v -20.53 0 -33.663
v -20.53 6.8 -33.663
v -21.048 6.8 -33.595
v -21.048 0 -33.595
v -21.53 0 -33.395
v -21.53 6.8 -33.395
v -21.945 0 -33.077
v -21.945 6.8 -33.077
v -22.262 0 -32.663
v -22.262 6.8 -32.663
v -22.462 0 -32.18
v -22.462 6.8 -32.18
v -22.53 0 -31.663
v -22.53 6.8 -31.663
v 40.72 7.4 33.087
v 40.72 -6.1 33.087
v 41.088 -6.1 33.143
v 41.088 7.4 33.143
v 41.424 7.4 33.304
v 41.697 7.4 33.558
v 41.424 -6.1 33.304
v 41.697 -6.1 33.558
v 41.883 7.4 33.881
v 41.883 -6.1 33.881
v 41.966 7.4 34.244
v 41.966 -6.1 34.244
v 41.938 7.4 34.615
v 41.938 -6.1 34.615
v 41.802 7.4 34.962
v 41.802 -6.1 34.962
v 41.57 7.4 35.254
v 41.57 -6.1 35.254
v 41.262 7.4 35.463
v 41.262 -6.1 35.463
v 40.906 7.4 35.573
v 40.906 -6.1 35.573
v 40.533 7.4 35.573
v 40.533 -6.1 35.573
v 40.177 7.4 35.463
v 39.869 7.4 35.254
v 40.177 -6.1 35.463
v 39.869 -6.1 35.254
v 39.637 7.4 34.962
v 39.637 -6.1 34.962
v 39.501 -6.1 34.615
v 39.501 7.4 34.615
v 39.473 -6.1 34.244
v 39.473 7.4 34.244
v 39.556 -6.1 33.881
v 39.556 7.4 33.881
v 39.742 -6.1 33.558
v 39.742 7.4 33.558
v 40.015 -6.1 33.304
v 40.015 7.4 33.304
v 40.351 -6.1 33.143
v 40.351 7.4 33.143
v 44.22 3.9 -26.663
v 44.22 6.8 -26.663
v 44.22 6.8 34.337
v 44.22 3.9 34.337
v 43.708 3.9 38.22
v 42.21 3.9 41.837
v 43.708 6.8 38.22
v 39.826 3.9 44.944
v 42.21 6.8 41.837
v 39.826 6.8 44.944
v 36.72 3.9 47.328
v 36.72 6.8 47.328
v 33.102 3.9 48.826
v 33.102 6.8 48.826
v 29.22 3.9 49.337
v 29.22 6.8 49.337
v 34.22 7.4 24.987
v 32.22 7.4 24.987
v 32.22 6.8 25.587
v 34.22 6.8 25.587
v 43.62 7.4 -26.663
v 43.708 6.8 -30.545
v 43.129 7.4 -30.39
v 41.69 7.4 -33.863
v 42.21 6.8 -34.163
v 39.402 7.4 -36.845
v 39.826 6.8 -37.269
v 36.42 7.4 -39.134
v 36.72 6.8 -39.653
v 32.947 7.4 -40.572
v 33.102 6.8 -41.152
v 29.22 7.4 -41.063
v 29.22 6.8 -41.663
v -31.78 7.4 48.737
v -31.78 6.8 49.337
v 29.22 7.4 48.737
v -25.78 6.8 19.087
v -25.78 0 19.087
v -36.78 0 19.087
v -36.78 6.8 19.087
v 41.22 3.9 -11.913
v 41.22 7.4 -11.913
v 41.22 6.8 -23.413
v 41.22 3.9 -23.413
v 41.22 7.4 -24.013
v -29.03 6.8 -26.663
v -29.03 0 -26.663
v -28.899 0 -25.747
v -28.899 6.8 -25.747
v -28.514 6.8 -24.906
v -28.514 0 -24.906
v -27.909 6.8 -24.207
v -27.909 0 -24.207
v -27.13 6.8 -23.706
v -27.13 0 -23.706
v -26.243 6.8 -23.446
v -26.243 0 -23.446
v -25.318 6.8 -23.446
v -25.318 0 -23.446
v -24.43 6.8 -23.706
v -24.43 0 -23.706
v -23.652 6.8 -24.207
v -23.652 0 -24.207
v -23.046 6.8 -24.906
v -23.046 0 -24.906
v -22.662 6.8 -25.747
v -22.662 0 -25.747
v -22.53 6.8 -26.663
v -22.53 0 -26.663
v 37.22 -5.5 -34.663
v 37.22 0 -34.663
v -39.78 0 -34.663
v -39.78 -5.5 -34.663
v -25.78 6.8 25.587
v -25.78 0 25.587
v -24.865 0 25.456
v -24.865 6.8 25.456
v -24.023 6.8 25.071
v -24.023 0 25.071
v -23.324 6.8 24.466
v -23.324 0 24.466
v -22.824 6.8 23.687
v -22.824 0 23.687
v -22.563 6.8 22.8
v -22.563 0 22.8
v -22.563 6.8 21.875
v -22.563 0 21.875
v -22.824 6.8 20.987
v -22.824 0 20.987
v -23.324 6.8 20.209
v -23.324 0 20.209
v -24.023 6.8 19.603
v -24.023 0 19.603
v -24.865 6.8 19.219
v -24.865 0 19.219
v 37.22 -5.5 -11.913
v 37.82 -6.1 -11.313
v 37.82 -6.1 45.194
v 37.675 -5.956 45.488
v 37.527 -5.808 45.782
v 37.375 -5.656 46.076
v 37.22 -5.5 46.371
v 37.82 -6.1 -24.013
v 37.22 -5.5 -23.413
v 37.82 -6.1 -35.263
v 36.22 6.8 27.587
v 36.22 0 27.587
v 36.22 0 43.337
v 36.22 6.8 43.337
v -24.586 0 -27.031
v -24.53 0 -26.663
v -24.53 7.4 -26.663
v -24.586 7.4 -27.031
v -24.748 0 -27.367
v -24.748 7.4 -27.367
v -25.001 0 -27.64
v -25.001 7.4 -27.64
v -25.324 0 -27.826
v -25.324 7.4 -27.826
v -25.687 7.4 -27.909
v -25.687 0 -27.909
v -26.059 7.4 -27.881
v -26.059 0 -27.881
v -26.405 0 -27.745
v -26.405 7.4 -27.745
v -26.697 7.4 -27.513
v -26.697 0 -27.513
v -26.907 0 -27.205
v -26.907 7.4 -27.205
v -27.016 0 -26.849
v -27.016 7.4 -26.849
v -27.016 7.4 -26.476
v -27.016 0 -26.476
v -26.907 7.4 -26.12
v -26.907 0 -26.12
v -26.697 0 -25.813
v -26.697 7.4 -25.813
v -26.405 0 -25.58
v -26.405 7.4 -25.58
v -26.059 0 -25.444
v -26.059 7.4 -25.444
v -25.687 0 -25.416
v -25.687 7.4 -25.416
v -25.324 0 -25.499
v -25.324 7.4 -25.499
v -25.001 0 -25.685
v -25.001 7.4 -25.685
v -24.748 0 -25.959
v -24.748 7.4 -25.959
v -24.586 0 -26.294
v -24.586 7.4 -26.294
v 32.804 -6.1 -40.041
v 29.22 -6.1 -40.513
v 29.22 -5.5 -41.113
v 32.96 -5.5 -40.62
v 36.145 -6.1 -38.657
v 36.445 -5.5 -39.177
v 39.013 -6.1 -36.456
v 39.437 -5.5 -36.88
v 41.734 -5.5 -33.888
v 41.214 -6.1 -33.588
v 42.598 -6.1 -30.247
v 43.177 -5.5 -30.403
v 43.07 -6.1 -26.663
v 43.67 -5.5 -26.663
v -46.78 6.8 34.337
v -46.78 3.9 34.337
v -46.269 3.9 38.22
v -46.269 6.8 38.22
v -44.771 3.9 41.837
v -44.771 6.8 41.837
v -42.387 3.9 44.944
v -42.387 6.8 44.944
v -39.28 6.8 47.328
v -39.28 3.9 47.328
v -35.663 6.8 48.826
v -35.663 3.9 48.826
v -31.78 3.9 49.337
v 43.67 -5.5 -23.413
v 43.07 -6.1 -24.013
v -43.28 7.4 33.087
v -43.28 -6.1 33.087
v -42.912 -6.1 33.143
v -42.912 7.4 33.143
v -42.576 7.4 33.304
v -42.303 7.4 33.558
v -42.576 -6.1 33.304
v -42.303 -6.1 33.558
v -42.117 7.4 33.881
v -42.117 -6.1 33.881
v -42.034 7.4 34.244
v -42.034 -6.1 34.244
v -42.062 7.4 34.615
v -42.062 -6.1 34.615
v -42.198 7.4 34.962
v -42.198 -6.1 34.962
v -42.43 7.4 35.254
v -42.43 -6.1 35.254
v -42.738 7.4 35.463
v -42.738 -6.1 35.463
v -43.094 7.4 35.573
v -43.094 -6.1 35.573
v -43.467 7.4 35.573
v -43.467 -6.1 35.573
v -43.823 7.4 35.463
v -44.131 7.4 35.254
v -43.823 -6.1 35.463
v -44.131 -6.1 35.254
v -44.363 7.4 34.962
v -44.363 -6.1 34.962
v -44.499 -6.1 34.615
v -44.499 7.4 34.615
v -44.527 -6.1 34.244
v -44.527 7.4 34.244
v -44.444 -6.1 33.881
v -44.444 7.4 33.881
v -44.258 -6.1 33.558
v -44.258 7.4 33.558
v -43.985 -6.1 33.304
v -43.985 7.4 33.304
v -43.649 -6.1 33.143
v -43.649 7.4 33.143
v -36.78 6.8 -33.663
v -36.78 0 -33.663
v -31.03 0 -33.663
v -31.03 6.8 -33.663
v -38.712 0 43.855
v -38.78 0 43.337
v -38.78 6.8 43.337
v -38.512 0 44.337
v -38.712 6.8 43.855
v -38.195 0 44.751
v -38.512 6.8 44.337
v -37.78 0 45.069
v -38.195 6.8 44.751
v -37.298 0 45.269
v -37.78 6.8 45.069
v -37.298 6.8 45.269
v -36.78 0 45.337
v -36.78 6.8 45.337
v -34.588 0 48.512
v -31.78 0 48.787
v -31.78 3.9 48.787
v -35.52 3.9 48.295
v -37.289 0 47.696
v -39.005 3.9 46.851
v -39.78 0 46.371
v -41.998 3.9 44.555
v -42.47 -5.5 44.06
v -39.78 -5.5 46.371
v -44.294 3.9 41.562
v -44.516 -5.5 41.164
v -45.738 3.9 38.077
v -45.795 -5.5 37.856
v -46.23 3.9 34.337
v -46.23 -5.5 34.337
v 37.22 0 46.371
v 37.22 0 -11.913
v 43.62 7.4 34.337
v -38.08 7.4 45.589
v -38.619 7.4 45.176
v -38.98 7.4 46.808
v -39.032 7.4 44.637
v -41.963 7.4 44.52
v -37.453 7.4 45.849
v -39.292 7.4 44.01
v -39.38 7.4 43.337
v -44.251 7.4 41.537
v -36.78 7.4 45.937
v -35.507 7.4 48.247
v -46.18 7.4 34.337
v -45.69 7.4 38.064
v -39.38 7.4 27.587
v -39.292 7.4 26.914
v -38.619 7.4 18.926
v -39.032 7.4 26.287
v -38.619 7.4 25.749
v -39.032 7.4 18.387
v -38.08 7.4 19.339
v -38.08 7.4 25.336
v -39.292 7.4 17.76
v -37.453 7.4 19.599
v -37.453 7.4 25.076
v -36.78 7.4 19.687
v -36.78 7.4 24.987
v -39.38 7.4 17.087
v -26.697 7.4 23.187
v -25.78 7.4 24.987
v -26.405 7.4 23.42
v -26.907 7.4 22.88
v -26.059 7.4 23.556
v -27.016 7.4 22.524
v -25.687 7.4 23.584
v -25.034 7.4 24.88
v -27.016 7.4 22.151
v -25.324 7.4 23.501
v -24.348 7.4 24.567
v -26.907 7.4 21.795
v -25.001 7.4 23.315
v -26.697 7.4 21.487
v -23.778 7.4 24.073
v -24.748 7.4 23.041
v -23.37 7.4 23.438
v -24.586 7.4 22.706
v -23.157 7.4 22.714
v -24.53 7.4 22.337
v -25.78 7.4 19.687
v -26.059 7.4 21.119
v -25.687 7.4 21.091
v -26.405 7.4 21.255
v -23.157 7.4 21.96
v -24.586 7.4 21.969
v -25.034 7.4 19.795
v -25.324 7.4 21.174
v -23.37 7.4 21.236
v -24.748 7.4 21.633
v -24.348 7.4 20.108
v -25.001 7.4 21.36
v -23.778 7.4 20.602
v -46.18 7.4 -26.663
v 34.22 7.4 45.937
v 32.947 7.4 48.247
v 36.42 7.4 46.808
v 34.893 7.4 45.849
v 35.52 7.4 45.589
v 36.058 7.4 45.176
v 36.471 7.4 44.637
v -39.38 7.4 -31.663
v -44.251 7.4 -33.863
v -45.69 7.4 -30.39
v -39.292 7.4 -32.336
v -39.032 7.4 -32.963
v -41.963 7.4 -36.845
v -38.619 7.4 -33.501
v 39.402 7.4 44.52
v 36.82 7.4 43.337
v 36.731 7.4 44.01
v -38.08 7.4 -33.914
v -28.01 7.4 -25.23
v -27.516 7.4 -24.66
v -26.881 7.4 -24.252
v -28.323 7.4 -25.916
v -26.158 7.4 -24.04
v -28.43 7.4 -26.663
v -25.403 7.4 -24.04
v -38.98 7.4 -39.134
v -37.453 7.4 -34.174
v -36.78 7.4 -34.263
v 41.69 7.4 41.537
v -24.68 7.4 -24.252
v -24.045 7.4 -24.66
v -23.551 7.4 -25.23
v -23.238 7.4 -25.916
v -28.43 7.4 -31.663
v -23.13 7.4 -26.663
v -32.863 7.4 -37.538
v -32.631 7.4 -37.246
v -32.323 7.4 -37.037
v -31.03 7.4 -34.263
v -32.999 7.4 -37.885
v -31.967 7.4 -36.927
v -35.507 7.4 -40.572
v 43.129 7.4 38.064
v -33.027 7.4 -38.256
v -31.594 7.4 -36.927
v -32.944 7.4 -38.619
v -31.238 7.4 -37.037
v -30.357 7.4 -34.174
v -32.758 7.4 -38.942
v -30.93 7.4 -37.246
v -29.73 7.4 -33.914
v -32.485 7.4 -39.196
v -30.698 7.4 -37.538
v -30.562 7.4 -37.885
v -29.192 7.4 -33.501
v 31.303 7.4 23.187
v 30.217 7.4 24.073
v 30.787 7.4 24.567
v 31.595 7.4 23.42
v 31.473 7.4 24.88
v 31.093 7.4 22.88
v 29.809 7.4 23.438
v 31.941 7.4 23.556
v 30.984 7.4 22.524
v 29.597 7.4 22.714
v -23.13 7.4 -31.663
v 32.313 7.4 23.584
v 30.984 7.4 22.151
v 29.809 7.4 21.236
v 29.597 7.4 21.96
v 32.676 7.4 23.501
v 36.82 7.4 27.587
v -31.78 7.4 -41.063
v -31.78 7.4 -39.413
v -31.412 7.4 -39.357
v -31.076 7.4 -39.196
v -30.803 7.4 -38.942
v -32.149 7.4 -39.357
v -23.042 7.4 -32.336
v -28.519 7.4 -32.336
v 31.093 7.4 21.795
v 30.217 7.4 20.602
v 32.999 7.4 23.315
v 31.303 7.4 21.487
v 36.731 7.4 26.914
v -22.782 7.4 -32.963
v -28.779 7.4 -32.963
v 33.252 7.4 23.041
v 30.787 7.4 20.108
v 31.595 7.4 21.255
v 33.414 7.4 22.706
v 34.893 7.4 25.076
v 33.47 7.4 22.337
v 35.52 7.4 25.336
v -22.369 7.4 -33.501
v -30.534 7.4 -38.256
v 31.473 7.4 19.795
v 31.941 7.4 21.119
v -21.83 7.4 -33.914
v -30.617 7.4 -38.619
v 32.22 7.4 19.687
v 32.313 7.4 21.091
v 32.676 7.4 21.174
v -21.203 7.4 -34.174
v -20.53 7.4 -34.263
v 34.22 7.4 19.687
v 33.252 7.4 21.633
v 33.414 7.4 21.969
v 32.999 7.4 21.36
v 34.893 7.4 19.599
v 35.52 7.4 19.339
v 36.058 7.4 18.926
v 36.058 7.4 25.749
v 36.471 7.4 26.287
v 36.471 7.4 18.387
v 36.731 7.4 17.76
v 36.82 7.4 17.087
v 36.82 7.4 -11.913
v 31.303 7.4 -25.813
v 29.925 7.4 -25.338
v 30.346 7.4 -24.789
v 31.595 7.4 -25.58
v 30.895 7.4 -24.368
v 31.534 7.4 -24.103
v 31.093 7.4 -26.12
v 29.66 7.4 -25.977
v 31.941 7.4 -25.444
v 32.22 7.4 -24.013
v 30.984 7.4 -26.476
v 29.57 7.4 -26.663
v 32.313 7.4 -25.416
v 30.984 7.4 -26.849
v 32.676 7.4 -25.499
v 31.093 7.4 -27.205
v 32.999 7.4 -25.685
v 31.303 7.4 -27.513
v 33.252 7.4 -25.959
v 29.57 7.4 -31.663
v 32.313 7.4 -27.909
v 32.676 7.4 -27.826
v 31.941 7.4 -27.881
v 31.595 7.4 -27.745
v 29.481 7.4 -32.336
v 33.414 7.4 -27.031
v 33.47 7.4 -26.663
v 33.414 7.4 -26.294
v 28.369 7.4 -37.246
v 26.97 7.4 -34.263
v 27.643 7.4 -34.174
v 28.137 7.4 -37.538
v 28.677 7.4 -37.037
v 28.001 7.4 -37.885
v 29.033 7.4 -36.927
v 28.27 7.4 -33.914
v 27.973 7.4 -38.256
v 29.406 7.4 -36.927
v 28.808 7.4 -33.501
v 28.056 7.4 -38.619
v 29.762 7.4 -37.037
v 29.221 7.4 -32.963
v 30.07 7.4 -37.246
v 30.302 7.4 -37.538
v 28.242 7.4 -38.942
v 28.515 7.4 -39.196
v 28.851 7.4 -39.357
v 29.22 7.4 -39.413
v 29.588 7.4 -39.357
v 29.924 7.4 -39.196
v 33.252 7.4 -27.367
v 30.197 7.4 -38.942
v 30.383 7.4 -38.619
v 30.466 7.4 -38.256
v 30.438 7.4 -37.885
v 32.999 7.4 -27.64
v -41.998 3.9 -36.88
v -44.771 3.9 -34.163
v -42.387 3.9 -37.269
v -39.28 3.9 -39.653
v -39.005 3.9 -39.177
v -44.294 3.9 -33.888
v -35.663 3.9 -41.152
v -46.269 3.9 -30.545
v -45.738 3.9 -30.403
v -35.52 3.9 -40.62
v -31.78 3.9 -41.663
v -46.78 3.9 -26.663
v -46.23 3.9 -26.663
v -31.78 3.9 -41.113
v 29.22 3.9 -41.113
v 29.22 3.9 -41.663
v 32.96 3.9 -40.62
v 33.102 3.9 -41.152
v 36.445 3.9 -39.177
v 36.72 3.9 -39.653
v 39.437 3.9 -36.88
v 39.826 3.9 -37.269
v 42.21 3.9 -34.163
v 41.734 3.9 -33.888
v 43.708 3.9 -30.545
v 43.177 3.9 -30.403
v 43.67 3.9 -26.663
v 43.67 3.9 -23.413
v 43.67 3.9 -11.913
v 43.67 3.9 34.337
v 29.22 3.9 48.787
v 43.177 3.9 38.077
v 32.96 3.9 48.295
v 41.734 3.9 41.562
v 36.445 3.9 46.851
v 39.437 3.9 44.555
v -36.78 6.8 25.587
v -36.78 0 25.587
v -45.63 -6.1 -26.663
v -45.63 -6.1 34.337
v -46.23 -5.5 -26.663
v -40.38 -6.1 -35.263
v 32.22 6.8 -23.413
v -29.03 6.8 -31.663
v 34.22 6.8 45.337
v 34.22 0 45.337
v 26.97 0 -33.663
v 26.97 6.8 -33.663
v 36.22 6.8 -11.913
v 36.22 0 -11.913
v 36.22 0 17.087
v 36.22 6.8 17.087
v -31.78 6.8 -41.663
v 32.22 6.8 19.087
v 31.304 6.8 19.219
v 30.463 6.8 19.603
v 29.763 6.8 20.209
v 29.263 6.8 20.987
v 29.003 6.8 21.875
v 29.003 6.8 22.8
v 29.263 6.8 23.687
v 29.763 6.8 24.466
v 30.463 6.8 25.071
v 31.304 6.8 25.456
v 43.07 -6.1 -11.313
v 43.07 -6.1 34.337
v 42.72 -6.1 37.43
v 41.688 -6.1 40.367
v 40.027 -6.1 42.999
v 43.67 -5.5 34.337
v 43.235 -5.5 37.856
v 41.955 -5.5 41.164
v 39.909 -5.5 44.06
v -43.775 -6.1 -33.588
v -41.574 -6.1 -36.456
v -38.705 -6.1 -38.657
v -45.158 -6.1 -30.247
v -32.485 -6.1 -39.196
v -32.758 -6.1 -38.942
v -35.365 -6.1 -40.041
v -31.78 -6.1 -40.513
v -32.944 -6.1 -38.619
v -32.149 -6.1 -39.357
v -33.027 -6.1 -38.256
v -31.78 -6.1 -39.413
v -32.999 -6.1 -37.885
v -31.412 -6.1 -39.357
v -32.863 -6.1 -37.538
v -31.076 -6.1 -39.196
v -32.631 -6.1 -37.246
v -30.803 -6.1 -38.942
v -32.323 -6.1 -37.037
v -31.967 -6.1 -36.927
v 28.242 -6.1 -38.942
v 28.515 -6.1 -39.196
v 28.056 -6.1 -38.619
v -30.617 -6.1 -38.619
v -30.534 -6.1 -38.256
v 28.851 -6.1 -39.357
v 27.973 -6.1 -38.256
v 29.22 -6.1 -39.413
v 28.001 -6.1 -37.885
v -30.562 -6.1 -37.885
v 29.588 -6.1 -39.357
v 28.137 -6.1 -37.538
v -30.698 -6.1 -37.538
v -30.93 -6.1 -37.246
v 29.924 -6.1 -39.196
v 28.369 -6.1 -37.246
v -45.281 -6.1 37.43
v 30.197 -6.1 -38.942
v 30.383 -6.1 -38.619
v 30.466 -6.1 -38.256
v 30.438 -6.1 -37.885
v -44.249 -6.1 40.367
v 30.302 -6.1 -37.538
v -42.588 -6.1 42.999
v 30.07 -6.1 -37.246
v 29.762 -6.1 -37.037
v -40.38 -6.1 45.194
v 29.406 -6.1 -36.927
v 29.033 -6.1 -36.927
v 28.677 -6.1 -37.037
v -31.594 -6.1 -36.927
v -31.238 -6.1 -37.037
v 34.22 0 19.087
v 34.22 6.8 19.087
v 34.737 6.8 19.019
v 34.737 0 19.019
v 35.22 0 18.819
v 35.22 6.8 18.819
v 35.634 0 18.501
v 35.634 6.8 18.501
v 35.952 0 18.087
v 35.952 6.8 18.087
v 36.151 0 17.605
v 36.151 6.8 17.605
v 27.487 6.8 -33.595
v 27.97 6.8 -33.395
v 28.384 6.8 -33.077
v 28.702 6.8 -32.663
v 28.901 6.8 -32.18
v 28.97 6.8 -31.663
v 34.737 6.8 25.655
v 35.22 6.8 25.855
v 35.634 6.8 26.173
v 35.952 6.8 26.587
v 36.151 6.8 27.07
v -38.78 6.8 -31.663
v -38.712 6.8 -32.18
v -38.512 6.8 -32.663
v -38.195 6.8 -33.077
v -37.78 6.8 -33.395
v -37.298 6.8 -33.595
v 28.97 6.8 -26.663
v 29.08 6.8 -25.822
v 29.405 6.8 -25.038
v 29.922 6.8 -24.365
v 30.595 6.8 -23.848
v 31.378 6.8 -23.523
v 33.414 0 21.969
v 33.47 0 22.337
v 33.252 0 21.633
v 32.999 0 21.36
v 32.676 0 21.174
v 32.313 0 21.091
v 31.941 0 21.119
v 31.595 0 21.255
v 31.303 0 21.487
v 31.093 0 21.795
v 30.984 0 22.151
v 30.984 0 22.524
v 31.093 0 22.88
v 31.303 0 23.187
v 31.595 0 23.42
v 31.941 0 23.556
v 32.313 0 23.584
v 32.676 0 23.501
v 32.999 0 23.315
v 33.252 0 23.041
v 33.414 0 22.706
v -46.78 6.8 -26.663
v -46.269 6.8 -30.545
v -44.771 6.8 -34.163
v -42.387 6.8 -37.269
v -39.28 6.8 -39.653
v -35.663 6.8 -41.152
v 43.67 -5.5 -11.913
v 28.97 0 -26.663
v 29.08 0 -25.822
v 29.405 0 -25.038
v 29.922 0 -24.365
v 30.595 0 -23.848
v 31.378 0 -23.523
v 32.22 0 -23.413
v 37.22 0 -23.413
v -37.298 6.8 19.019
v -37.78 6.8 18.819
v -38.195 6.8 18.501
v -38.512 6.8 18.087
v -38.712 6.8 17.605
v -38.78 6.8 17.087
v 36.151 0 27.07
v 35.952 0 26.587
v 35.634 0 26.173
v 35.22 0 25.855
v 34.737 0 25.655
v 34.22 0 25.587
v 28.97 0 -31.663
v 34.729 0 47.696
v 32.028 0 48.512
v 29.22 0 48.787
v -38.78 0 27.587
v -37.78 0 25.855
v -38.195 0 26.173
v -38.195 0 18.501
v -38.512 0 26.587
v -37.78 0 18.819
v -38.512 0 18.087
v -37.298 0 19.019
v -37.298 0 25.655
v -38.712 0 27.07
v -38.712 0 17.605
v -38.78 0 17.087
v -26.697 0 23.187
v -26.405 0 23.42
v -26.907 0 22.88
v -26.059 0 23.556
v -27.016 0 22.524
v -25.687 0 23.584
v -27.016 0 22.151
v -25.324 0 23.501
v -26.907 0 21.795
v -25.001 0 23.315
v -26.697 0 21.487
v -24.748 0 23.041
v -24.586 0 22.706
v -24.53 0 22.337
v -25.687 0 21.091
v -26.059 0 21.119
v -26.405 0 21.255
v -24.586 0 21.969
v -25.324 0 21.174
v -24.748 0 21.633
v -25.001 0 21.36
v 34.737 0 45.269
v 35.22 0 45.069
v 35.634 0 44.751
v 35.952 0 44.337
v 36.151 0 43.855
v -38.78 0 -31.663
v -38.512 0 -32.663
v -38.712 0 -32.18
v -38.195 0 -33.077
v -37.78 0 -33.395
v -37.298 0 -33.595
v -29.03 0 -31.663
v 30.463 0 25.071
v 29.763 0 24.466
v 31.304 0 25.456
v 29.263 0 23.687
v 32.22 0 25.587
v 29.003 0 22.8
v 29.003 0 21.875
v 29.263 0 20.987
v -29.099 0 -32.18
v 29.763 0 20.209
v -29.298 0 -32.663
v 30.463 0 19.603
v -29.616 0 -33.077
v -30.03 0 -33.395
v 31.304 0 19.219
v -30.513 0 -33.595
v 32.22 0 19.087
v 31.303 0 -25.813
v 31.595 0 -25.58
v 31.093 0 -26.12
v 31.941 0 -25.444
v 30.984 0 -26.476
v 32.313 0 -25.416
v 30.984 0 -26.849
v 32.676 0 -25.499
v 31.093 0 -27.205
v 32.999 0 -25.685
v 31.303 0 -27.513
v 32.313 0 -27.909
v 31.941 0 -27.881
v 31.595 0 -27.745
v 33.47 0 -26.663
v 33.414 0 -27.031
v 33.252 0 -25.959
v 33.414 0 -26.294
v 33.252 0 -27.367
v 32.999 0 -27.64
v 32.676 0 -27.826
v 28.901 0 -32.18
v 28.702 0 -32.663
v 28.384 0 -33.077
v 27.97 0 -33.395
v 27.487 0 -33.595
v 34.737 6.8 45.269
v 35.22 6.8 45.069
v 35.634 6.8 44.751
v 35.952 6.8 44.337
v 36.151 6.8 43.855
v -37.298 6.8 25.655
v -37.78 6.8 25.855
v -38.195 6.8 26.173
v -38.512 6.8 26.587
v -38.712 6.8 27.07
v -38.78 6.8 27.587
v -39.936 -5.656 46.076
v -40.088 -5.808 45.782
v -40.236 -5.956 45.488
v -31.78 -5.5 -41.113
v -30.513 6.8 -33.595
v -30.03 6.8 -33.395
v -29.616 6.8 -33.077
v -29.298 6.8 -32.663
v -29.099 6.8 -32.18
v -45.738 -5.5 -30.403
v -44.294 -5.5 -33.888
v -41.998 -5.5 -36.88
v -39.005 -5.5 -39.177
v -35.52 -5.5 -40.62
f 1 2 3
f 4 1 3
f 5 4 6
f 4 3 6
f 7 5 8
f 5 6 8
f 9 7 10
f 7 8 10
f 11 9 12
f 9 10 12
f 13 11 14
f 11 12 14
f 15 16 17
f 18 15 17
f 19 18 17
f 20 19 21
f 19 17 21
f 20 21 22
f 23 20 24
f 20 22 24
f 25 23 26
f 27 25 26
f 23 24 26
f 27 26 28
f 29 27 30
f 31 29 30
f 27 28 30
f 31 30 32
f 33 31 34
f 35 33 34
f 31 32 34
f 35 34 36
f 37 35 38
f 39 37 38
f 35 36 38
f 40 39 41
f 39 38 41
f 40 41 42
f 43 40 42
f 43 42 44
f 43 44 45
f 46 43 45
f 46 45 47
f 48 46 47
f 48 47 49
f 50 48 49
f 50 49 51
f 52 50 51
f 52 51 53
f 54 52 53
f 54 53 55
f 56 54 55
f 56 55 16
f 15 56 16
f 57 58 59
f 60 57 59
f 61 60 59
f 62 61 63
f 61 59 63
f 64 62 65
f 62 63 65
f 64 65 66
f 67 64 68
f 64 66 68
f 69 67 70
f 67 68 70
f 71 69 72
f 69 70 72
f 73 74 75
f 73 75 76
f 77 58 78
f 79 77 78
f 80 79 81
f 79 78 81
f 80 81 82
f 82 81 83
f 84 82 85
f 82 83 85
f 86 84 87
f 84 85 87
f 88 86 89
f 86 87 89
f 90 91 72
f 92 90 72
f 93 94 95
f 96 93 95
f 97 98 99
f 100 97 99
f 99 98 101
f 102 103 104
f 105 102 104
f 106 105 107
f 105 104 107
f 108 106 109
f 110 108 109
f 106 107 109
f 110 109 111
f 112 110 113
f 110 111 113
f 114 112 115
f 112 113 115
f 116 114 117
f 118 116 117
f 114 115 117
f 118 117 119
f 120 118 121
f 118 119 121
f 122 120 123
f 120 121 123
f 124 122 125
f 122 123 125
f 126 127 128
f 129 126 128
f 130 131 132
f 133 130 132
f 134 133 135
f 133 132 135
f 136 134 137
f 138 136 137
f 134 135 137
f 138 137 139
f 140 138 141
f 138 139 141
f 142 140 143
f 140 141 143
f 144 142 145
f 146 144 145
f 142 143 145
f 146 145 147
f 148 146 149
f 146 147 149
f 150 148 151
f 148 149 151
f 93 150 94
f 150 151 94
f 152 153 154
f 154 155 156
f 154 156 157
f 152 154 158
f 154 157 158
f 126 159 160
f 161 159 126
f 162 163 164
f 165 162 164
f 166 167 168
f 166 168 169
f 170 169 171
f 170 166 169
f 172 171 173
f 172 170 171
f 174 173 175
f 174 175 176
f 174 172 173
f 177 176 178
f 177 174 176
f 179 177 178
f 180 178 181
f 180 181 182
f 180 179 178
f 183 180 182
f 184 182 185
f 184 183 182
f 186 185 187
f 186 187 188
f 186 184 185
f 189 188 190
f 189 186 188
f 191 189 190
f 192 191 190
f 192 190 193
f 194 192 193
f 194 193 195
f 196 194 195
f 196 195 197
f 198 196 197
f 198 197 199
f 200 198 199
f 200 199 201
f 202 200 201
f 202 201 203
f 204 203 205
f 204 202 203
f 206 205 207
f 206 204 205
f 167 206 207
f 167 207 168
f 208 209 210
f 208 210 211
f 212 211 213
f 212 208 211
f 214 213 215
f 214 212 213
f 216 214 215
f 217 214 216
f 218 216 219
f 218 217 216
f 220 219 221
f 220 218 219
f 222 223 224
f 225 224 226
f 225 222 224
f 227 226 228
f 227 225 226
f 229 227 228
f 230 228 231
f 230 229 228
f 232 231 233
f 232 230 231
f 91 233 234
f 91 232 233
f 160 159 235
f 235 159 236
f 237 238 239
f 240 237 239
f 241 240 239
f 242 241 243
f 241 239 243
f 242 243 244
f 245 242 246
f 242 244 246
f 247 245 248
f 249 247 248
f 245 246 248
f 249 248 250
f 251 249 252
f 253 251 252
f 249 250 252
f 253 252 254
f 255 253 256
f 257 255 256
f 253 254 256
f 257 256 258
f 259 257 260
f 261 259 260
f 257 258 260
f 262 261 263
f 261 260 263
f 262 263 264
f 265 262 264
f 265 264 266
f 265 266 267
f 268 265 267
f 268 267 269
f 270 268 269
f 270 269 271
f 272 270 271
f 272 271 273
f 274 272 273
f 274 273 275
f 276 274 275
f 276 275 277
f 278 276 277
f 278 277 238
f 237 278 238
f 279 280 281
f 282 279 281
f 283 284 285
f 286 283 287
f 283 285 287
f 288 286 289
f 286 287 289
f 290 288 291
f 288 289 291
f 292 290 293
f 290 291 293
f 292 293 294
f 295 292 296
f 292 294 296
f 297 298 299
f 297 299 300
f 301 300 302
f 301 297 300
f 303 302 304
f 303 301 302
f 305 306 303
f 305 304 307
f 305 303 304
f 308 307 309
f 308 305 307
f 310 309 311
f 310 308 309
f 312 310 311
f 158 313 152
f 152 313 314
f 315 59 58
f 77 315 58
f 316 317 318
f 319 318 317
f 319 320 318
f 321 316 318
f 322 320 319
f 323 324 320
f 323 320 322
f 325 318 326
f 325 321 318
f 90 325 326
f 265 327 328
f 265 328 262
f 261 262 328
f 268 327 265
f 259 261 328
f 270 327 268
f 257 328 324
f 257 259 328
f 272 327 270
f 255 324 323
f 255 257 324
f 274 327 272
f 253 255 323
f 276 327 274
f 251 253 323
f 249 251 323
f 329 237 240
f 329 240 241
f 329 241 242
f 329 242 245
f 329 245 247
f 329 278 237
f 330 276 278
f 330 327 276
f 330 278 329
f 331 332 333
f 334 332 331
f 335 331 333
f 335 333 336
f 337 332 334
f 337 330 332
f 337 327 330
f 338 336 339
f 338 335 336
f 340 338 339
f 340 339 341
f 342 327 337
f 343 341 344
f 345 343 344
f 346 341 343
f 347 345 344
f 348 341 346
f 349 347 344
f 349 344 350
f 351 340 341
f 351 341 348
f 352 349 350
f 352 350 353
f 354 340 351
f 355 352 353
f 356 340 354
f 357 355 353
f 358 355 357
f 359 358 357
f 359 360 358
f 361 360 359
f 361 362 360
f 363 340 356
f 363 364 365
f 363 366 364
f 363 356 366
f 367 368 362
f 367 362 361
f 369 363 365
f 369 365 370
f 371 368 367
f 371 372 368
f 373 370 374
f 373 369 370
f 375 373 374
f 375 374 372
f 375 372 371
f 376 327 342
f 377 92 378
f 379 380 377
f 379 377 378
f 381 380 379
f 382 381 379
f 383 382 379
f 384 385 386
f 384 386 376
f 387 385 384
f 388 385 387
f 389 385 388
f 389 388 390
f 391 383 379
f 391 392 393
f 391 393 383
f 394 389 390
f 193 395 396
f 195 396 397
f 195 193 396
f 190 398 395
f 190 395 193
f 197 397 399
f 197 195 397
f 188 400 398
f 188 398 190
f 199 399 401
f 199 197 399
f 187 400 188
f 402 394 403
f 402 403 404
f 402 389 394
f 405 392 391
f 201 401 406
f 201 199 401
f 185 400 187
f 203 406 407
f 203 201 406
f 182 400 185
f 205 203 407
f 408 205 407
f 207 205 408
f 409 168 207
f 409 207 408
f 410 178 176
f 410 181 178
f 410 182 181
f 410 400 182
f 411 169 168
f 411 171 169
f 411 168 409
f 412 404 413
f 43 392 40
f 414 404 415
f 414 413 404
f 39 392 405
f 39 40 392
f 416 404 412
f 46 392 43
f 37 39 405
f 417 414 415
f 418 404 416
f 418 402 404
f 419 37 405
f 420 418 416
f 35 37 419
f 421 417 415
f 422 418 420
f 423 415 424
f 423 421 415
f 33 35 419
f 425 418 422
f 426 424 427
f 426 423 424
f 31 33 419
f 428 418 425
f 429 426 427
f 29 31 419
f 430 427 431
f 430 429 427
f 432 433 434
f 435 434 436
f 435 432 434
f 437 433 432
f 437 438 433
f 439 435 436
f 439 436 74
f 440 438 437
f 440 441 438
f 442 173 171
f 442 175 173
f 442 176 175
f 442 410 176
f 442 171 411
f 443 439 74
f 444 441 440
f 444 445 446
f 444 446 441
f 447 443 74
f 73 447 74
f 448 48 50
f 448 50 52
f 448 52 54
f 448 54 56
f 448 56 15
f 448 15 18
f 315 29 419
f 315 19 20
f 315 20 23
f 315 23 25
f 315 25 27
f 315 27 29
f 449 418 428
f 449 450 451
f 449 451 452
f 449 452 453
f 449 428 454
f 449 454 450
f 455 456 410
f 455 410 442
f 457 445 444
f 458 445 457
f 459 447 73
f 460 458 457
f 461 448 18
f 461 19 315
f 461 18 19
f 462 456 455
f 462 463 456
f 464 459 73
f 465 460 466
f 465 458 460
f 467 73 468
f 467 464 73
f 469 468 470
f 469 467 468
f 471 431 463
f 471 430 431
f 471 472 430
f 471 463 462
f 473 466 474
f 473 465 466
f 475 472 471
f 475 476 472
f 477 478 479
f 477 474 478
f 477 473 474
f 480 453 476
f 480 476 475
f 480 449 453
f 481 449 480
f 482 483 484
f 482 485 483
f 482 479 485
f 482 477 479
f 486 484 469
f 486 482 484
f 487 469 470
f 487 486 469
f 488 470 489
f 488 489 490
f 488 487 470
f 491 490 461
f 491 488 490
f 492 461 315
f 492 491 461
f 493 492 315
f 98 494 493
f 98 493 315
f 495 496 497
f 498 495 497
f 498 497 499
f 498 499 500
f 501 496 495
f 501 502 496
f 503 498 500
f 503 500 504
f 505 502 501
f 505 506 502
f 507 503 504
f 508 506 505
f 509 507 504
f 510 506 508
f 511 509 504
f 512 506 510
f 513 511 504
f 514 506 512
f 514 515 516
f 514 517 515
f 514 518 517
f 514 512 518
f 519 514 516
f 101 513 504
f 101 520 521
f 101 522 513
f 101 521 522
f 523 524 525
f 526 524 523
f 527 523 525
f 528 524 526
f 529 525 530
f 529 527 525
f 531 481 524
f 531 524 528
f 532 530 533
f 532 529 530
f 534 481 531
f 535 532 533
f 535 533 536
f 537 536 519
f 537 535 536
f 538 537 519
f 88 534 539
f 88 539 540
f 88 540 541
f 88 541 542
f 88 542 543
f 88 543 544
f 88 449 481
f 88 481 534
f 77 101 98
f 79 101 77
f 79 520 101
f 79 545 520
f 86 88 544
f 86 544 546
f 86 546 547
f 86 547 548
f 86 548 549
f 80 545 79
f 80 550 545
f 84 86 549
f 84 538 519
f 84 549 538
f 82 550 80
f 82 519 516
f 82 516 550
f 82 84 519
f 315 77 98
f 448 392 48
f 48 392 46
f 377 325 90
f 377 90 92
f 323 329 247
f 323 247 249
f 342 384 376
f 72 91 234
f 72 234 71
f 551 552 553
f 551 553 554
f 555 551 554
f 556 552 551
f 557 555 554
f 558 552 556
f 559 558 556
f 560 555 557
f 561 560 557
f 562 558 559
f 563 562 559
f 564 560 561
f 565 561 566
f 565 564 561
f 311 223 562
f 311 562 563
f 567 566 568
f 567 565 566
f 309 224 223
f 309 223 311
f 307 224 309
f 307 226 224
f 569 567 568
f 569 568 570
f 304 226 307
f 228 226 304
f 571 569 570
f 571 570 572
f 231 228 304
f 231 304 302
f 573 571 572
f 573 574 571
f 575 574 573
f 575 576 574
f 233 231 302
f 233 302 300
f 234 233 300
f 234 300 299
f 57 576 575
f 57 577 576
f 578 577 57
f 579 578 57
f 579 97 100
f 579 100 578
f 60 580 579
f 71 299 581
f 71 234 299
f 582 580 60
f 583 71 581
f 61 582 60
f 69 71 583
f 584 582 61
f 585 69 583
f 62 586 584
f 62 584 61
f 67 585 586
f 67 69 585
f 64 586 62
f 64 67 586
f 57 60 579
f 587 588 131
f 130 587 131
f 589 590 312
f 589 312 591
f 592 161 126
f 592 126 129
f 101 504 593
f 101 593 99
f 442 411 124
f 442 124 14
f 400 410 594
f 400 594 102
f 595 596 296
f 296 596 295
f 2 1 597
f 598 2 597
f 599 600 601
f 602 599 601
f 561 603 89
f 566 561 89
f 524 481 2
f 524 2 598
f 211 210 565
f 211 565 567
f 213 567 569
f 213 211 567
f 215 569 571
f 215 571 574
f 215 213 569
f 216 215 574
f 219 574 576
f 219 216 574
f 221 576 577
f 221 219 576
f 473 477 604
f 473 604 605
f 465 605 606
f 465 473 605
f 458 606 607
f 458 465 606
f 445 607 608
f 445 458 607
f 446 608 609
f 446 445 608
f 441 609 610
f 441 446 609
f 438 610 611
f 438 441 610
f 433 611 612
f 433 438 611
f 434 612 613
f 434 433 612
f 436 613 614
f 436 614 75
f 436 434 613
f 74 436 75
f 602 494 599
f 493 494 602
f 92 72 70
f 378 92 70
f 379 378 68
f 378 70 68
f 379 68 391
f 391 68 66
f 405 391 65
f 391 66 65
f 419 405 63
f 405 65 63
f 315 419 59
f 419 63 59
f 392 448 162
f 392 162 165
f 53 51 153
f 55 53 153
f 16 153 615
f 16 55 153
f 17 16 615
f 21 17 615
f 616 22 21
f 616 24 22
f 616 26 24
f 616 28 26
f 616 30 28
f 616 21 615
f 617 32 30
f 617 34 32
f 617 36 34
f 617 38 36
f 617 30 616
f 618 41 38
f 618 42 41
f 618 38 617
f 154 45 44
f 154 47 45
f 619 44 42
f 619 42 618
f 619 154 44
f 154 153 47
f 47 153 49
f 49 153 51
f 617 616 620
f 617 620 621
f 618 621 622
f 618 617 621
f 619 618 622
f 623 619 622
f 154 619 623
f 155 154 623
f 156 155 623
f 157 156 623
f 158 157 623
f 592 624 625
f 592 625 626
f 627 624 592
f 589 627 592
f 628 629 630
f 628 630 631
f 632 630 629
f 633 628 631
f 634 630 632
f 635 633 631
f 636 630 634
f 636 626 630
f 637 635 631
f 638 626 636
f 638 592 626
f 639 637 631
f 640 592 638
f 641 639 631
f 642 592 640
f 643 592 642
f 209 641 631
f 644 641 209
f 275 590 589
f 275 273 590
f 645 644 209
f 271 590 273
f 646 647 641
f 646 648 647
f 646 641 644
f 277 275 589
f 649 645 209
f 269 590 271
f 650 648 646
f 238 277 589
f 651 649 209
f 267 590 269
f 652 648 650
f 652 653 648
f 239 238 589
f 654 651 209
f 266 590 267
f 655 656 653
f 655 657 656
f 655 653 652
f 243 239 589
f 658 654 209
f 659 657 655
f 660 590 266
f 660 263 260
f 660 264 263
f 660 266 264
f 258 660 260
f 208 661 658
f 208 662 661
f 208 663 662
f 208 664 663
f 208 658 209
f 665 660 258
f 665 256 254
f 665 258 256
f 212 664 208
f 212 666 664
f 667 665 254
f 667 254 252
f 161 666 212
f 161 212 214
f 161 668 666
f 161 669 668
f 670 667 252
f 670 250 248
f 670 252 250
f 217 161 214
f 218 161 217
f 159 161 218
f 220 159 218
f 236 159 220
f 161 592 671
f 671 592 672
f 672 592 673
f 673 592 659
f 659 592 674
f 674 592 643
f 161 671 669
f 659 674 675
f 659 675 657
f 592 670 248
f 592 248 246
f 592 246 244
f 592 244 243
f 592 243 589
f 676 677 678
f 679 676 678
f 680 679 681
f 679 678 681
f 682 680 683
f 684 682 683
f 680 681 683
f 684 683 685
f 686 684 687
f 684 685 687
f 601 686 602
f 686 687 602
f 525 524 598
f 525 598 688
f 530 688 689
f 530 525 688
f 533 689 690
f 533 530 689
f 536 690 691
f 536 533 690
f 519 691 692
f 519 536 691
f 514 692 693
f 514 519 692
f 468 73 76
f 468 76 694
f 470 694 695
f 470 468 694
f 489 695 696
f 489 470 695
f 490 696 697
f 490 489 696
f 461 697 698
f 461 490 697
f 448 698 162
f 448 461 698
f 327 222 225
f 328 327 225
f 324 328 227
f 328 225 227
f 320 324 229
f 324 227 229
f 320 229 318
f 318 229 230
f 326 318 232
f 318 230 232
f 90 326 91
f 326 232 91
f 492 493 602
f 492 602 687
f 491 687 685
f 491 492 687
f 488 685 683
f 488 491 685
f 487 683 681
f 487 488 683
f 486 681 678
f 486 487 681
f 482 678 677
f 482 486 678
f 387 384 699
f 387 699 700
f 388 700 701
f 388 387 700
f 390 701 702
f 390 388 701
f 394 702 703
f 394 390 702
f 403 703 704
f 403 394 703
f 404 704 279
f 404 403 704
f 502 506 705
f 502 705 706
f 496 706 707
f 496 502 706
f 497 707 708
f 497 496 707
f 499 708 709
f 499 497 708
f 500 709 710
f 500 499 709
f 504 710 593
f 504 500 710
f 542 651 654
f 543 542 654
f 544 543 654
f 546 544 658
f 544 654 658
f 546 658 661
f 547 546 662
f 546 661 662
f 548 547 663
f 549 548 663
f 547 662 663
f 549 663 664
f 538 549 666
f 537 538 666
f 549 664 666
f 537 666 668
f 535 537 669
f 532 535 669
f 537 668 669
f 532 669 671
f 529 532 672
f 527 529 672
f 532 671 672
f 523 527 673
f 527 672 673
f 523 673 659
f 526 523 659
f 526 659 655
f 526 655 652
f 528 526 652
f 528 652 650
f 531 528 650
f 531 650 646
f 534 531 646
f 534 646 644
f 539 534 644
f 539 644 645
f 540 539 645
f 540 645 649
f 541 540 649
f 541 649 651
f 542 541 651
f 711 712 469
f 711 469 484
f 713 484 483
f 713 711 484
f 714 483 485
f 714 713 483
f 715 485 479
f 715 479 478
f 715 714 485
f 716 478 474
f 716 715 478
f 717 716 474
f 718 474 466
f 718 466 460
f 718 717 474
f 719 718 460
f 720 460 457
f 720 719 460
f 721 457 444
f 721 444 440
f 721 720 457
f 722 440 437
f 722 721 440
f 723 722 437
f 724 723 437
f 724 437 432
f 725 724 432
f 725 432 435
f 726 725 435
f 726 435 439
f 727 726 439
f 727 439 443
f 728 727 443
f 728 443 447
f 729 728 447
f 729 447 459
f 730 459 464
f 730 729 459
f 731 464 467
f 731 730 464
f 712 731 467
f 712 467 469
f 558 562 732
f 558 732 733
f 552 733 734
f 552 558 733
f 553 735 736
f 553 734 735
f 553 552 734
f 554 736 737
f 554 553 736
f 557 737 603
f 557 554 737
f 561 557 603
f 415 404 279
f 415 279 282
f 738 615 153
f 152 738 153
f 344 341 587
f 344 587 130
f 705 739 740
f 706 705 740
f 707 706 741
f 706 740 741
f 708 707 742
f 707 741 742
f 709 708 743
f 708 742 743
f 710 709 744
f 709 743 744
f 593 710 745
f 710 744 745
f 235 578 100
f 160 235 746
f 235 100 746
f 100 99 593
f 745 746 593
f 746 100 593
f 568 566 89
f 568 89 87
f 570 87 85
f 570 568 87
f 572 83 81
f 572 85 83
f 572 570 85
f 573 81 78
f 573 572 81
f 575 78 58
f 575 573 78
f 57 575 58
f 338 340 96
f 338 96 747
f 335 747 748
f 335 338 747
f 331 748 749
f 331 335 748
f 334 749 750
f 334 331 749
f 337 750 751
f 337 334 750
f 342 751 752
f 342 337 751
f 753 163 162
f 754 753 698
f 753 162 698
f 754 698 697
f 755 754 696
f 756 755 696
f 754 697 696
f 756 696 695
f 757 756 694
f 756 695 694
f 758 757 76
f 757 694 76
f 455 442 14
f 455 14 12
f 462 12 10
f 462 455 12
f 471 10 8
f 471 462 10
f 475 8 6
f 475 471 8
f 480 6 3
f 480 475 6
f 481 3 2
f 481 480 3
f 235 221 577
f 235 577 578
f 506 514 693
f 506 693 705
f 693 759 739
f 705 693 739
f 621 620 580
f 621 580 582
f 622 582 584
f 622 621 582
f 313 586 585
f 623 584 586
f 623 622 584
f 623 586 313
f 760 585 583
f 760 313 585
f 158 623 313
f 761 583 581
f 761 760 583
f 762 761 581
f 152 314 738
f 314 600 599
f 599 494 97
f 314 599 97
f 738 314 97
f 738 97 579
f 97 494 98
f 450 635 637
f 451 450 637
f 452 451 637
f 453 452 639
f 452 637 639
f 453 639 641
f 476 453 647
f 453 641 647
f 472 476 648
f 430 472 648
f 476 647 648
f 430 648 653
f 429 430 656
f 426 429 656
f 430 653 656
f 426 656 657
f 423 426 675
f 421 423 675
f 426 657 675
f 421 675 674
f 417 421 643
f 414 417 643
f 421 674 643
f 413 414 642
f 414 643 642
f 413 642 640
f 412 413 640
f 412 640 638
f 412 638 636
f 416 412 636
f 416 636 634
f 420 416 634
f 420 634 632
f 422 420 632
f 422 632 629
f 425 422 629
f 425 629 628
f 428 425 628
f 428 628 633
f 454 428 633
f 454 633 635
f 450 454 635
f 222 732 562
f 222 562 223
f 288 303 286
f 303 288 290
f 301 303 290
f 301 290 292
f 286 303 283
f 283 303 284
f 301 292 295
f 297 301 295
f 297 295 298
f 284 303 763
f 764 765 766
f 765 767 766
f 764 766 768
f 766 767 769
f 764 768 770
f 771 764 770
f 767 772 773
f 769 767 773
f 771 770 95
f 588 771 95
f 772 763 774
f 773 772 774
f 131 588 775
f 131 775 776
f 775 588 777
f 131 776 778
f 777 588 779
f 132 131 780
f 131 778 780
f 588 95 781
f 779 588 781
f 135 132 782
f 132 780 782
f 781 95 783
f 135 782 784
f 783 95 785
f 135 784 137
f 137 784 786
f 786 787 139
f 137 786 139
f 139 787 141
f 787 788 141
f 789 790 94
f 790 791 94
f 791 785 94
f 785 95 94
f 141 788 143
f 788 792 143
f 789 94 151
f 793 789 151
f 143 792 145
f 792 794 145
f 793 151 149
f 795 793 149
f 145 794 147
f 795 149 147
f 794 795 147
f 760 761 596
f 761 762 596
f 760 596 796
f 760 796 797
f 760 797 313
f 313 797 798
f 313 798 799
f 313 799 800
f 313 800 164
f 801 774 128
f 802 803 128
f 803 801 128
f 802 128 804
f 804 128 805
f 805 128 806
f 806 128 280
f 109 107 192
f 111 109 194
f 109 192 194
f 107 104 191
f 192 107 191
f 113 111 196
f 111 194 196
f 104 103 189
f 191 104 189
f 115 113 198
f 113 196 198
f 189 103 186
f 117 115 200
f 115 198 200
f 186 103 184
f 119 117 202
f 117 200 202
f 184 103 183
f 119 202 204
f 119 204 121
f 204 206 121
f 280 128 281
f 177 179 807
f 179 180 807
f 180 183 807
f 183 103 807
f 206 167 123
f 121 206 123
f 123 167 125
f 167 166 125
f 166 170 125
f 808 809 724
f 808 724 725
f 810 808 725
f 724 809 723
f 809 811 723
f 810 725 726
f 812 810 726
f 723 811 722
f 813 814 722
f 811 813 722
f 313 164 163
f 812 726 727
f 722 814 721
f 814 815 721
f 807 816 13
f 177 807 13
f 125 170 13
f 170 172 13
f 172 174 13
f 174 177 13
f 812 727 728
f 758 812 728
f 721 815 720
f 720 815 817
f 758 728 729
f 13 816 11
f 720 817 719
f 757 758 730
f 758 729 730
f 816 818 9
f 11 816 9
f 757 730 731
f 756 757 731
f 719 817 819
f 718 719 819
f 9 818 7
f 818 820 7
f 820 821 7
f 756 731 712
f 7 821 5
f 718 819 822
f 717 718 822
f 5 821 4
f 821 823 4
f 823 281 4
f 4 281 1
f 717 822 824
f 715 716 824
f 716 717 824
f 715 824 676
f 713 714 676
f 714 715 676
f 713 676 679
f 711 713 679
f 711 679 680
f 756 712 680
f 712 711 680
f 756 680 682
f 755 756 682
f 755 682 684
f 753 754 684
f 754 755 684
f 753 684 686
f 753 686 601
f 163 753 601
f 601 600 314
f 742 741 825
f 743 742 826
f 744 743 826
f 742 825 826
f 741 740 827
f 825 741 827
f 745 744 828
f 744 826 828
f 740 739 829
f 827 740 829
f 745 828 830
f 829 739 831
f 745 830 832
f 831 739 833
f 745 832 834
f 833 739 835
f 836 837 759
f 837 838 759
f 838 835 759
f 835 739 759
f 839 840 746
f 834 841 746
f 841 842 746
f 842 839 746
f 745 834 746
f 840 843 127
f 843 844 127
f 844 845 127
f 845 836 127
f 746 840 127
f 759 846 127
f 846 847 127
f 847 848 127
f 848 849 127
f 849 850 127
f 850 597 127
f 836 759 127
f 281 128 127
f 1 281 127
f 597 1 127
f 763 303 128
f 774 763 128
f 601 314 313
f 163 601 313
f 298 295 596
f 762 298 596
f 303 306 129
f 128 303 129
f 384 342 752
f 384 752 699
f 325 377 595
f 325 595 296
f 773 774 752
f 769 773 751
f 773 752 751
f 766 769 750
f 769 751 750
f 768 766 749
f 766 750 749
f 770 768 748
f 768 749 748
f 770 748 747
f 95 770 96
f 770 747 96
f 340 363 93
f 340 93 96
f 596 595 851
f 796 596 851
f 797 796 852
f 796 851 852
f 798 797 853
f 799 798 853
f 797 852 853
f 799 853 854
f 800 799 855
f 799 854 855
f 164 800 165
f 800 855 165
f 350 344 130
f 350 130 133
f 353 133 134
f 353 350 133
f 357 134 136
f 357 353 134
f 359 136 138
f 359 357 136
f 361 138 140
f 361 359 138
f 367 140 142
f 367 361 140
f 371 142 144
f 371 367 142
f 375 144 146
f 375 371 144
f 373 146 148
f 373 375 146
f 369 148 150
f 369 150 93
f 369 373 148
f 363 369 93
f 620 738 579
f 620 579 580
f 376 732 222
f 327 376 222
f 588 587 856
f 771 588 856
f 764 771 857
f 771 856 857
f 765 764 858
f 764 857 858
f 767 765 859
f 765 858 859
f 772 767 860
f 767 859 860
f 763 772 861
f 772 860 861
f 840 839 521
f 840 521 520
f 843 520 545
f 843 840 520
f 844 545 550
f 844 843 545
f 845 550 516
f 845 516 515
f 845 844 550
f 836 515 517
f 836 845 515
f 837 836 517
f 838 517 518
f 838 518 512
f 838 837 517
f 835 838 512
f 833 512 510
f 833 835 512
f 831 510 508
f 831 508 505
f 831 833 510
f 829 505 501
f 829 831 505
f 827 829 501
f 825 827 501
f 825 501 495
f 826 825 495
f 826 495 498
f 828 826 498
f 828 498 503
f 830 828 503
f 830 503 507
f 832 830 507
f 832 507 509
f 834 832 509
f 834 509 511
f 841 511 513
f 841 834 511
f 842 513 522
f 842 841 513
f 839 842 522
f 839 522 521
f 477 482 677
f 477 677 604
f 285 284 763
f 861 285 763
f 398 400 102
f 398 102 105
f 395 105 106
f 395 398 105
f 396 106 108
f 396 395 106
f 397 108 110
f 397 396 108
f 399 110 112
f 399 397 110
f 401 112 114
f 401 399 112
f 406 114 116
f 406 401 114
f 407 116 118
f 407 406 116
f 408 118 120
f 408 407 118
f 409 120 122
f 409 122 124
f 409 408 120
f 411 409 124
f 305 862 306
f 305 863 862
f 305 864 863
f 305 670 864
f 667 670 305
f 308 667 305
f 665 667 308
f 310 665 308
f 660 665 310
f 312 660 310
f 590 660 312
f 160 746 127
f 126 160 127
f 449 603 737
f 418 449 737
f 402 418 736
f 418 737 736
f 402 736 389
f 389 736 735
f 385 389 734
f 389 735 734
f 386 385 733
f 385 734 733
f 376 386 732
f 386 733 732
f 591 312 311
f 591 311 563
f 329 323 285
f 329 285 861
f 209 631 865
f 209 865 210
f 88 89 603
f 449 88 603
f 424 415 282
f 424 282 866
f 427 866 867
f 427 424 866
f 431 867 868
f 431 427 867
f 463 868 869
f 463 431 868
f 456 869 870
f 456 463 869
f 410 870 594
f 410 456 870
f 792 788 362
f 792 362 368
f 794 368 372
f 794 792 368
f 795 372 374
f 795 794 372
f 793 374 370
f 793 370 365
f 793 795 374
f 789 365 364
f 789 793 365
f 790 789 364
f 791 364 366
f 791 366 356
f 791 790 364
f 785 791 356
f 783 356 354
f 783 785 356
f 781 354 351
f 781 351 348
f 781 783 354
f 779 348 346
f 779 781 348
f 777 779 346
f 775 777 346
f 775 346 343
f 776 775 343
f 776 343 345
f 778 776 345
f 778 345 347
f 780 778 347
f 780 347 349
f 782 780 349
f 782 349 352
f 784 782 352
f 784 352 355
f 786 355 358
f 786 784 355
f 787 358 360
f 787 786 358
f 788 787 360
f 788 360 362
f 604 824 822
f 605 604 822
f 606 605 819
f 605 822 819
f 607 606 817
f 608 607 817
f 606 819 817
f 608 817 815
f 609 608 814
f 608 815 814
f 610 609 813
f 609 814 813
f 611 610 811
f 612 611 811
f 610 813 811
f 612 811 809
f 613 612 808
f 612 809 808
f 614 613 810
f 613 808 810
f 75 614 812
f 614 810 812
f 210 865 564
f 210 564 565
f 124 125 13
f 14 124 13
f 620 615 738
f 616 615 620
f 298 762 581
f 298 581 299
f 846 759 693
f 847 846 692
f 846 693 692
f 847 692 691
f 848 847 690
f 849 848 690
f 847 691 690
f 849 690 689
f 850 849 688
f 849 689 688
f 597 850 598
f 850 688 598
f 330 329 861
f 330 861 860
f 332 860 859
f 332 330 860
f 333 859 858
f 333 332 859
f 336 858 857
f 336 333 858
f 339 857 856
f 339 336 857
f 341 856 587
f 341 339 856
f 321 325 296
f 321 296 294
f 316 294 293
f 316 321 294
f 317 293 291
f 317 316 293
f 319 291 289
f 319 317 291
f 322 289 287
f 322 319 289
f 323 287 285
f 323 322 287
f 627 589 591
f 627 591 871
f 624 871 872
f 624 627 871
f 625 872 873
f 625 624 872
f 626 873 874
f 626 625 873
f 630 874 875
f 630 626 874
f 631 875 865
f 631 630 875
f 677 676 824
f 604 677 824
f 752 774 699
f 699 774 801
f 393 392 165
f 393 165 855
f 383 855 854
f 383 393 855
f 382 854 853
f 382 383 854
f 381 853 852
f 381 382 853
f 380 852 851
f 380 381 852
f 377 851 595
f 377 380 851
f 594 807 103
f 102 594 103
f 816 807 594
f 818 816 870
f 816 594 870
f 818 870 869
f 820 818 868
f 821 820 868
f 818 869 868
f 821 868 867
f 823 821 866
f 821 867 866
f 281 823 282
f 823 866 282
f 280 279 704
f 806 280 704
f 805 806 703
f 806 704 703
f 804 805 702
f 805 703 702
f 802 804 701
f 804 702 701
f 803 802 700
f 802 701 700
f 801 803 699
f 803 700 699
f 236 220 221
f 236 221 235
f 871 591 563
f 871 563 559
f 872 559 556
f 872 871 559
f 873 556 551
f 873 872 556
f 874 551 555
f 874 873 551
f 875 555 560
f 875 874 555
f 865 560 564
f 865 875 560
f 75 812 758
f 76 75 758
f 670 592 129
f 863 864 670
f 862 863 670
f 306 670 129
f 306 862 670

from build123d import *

# Parameters (mm, degrees)
SKETCH1_W                   = 91
SKETCH1_H                   = 91
SKETCH1_R                   = 1.25
BOSS_EXTRUDE1_DEPTH         = 7.4
SKETCH3_W                   = 5
SKETCH3_H                   = 11.5
CUT_EXTRUDE1_DEPTH          = 8.4
SKETCH4_W                   = 91
SKETCH4_H                   = 91
BOSS_EXTRUDE2_DEPTH         = 6.1
FILLET1_R                   = 15
CUT_EXTRUDE2_DEPTH          = 10
SKETCH9_W                   = 11.5
SKETCH9_H                   = 10
CUT_EXTRUDE3_DEPTH          = 10
CUT_EXTRUDE4_DEPTH          = 6.1
FILLET2_R                   = 2
TAP_DRILL_FOR_M3X0_5_TAP1_D = 2.5
CHAMFER1_SIZE               = 0.6


with BuildPart() as part:
    # Sketch1 → Boss-Extrude1 (new body)
    with BuildSketch(Plane(origin=(0, 0, 0), x_dir=(1, 0, 0), z_dir=(0, 1, 0))):
        with Locations((-1.280392157, -3.837254902)):
            Rectangle(SKETCH1_W, SKETCH1_H)
        with BuildLine():
            Line((28.969607843, 33.662745098), (28.969607843, 26.662745098))
            ThreePointArc((28.969607843, 26.662745098), (29.921510804, 24.364648059), (32.219607843, 23.412745098))
            Line((32.219607843, 23.412745098), (36.219607843, 23.412745098))
            Line((36.219607843, 23.412745098), (36.219607843, -19.087254902))
            Line((36.219607843, -19.087254902), (32.219607843, -19.087254902))
            ThreePointArc((32.219607843, -19.087254902), (28.969607843, -22.337254902), (32.219607843, -25.587254902))
            Line((32.219607843, -25.587254902), (36.219607843, -25.587254902))
            Line((36.219607843, -25.587254902), (36.219607843, -45.337254902))
            Line((36.219607843, -45.337254902), (-38.780392157, -45.337254902))
            Line((-38.780392157, -45.337254902), (-38.780392157, -25.587254902))
            Line((-38.780392157, -25.587254902), (-25.780392157, -25.587254902))
            ThreePointArc((-25.780392157, -25.587254902), (-22.530392157, -22.337254902), (-25.780392157, -19.087254902))
            Line((-25.780392157, -19.087254902), (-38.780392157, -19.087254902))
            Line((-38.780392157, -19.087254902), (-38.780392157, 33.662745098))
            Line((-38.780392157, 33.662745098), (-29.030392157, 33.662745098))
            Line((-29.030392157, 33.662745098), (-29.030392157, 26.662745098))
            ThreePointArc((-29.030392157, 26.662745098), (-25.780392157, 23.412745098), (-22.530392157, 26.662745098))
            Line((-22.530392157, 26.662745098), (-22.530392157, 33.662745098))
            Line((-22.530392157, 33.662745098), (28.969607843, 33.662745098))
        make_face(mode=Mode.SUBTRACT)
        with Locations((32.219607843, 26.662745098)):
            Circle(SKETCH1_R, mode=Mode.SUBTRACT)
        with Locations((-25.780392157, 26.662745098)):
            Circle(SKETCH1_R, mode=Mode.SUBTRACT)
        with Locations((32.219607843, -22.337254902)):
            Circle(SKETCH1_R, mode=Mode.SUBTRACT)
        with Locations((-25.780392157, -22.337254902)):
            Circle(SKETCH1_R, mode=Mode.SUBTRACT)
    extrude(amount=BOSS_EXTRUDE1_DEPTH)

    # Sketch3 → Cut-Extrude1 (cut, through all)
    with BuildSketch(Plane.XZ):
        with Locations((38.719607843, -17.662745098)):
            Rectangle(SKETCH3_W, SKETCH3_H)
    extrude(amount=-CUT_EXTRUDE1_DEPTH, mode=Mode.SUBTRACT)

    # Sketch4 → Boss-Extrude2 (add)
    with BuildSketch(Plane.XZ):
        with Locations((-1.280392157, 3.837254902)):
            Rectangle(SKETCH4_W, SKETCH4_H)
        Polygon((37.219607843, 45.337254902), (37.219607843, -11.912745098), (41.219607843, -11.912745098), (41.219607843, -23.412745098), (37.219607843, -23.412745098), (37.219607843, -33.662745098), (37.219607843, -34.662745098), (36.219607843, -34.662745098), (-39.780392157, -34.662745098), (-39.780392157, 25.587254902), (-39.780392157, 45.337254902), (-39.780392157, 46.337254902), (-38.780392157, 46.337254902), (36.219607843, 46.337254902), (37.219607843, 46.337254902), align=None, mode=Mode.SUBTRACT)
    extrude(amount=BOSS_EXTRUDE2_DEPTH)

    # Fillet1
    fillet1_edges = [part.edges().sort_by_distance(p)[0] for p in [
        (-46.780392157, 0.65, 49.337254902),
        (-46.780392157, 0.65, -41.662745098),
        (44.219607843, 0.65, -41.662745098),
        (44.219607843, 0.65, 49.337254902),
    ]]
    fillet(fillet1_edges, radius=FILLET1_R)

    # Sketch8 → Cut-Extrude2 (cut)
    with BuildSketch(Plane.XZ.offset(6.1)):
        with BuildLine():
            Line((29.219607843, 49.337254902), (-31.780392157, 49.337254902))
            ThreePointArc((-31.780392157, 49.337254902), (-42.386993875, 44.94385662), (-46.780392157, 34.337254902))
            Line((-46.780392157, 34.337254902), (-46.780392157, -26.662745098))
            ThreePointArc((-46.780392157, -26.662745098), (-42.386993875, -37.269346816), (-31.780392157, -41.662745098))
            Line((-31.780392157, -41.662745098), (29.219607843, -41.662745098))
            ThreePointArc((29.219607843, -41.662745098), (39.826209561, -37.269346816), (44.219607843, -26.662745098))
            Line((44.219607843, -26.662745098), (44.219607843, 34.337254902))
            ThreePointArc((44.219607843, 34.337254902), (39.826209561, 44.94385662), (29.219607843, 49.337254902))
        make_face()
        with BuildLine():
            Line((29.219607843, 48.787254902), (-31.780392157, 48.787254902))
            ThreePointArc((-31.780392157, 48.787254902), (-41.998085145, 44.55494789), (-46.230392157, 34.337254902))
            Line((-46.230392157, 34.337254902), (-46.230392157, -26.662745098))
            ThreePointArc((-46.230392157, -26.662745098), (-41.998085145, -36.880438086), (-31.780392157, -41.112745098))
            Line((-31.780392157, -41.112745098), (29.219607843, -41.112745098))
            ThreePointArc((29.219607843, -41.112745098), (39.437300831, -36.880438086), (43.669607843, -26.662745098))
            Line((43.669607843, -26.662745098), (43.669607843, 34.337254902))
            ThreePointArc((43.669607843, 34.337254902), (39.437300831, 44.55494789), (29.219607843, 48.787254902))
        make_face(mode=Mode.SUBTRACT)
    extrude(amount=-CUT_EXTRUDE2_DEPTH, mode=Mode.SUBTRACT)

    # Sketch9 → Cut-Extrude3 (cut)
    with BuildSketch(Plane(origin=(43.669607843, 0, 0), x_dir=(0, 0, -1), z_dir=(1, 0, 0))):
        with Locations((17.662745098, -1.1)):
            Rectangle(SKETCH9_W, SKETCH9_H)
    extrude(amount=-CUT_EXTRUDE3_DEPTH, mode=Mode.SUBTRACT)

    # Sketch10 → Cut-Extrude4 (cut)
    with BuildSketch(Plane.XZ.offset(6.1)):
        with BuildLine():
            Line((-39.780392157, 46.337254902), (37.219607843, 46.337254902))
            Line((37.219607843, 46.337254902), (37.219607843, 46.370645945))
            ThreePointArc((37.219607843, 46.370645945), (33.398124292, 48.169915539), (29.219607843, 48.787254902))
            Line((29.219607843, 48.787254902), (-31.780392157, 48.787254902))
            ThreePointArc((-31.780392157, 48.787254902), (-35.958908606, 48.169915539), (-39.780392157, 46.370645945))
            Line((-39.780392157, 46.370645945), (-39.780392157, 46.337254902))
        make_face()
    extrude(amount=-CUT_EXTRUDE4_DEPTH, mode=Mode.SUBTRACT)

    # Fillet2
    fillet2_edges = [part.edges().sort_by_distance(p)[0] for p in [
        (-29.030392157, 3.7, -33.662745098),
        (-38.780392157, 3.7, -33.662745098),
        (-38.780392157, 3.7, 19.087254902),
        (-38.780392157, 3.7, 25.587254902),
        (-38.780392157, 3.7, 45.337254902),
        (36.219607843, 3.7, 45.337254902),
        (36.219607843, 3.7, 25.587254902),
        (36.219607843, 3.7, 19.087254902),
        (28.969607843, 3.7, -33.662745098),
        (-22.530392157, 3.7, -33.662745098),
    ]]
    fillet(fillet2_edges, radius=FILLET2_R)

    # Tap Drill for M3x0.5 Tap1 (through all)
    with Locations(Plane(origin=(-31.780392157, 7.4, -38.162745098), x_dir=(0, 0, 1), z_dir=(0, 1, 0))):
        with Locations((0, 0), (0, 61), (72.5, -11.5), (72.5, 72.5)):
            Hole(TAP_DRILL_FOR_M3X0_5_TAP1_D / 2)

    # Chamfer1
    chamfer1_edges = [part.edges().sort_by_distance(p)[0] for p in [
        (-29.030392157, 7.4, -29.162745098),
        (37.219607843, -6.1, 17.228950424),
        (37.219607843, -6.1, -29.037745098),
        (40.444607843, -6.1, -11.912745098),
        (40.444607843, -6.1, -23.412745098),
        (-1.280392157, -6.1, -34.662745098),
        (-39.780392157, -6.1, 5.853950424),
        (-1.280392157, 7.4, 49.337254902),
        (-46.780392157, 7.4, 3.837254902),
        (44.219607843, 7.4, 3.837254902),
        (-1.280392157, 7.4, -41.662745098),
        (-42.386993875, 7.4, -37.269346816),
        (39.826209561, 7.4, -37.269346816),
        (39.826209561, 7.4, 44.94385662),
        (-42.386993875, 7.4, 44.94385662),
        (-25.780392157, 7.4, -23.412745098),
        (41.955433297, -6.1, 41.163765724),
        (43.669607843, -6.1, -25.037745098),
        (39.437300831, -6.1, -36.880438086),
        (-1.280392157, -6.1, -41.112745098),
        (-41.998085145, -6.1, -36.880438086),
        (-46.230392157, -6.1, 3.837254902),
        (-22.530392157, 7.4, -29.162745098),
        (43.669607843, -6.1, 11.212254902),
        (-44.516217611, -6.1, 41.163765724),
        (-38.780392157, 7.4, -7.287745098),
        (-38.780392157, 7.4, 35.462254902),
        (36.219607843, 7.4, 35.462254902),
        (-33.905392157, 7.4, -33.662745098),
        (3.219607843, 7.4, -33.662745098),
        (-1.280392157, 7.4, 45.337254902),
        (-38.194605719, 7.4, 18.501468464),
        (-38.194605719, 7.4, 26.17304134),
        (35.633821406, 7.4, 26.17304134),
        (28.969607843, 7.4, -29.162745098),
        (35.633821406, 7.4, 18.501468464),
        (-38.194605719, 7.4, -33.07695866),
        (-29.616178594, 7.4, -33.07695866),
        (-21.944605719, 7.4, -33.07695866),
        (28.383821406, 7.4, -33.07695866),
        (-38.194605719, 7.4, 44.751468464),
        (35.633821406, 7.4, 44.751468464),
        (29.921510804, 7.4, -24.364648059),
        (36.719607843, 7.4, -23.412745098),
        (33.219607843, 7.4, 19.087254902),
        (28.969607843, 7.4, 22.337254902),
        (33.219607843, 7.4, 25.587254902),
        (-31.280392157, 7.4, 25.587254902),
        (-22.530392157, 7.4, 22.337254902),
        (36.219607843, 7.4, 2.587254902),
        (-31.280392157, 7.4, 19.087254902),
    ]]
    chamfer(chamfer1_edges, length=CHAMFER1_SIZE)


solid = part.part
